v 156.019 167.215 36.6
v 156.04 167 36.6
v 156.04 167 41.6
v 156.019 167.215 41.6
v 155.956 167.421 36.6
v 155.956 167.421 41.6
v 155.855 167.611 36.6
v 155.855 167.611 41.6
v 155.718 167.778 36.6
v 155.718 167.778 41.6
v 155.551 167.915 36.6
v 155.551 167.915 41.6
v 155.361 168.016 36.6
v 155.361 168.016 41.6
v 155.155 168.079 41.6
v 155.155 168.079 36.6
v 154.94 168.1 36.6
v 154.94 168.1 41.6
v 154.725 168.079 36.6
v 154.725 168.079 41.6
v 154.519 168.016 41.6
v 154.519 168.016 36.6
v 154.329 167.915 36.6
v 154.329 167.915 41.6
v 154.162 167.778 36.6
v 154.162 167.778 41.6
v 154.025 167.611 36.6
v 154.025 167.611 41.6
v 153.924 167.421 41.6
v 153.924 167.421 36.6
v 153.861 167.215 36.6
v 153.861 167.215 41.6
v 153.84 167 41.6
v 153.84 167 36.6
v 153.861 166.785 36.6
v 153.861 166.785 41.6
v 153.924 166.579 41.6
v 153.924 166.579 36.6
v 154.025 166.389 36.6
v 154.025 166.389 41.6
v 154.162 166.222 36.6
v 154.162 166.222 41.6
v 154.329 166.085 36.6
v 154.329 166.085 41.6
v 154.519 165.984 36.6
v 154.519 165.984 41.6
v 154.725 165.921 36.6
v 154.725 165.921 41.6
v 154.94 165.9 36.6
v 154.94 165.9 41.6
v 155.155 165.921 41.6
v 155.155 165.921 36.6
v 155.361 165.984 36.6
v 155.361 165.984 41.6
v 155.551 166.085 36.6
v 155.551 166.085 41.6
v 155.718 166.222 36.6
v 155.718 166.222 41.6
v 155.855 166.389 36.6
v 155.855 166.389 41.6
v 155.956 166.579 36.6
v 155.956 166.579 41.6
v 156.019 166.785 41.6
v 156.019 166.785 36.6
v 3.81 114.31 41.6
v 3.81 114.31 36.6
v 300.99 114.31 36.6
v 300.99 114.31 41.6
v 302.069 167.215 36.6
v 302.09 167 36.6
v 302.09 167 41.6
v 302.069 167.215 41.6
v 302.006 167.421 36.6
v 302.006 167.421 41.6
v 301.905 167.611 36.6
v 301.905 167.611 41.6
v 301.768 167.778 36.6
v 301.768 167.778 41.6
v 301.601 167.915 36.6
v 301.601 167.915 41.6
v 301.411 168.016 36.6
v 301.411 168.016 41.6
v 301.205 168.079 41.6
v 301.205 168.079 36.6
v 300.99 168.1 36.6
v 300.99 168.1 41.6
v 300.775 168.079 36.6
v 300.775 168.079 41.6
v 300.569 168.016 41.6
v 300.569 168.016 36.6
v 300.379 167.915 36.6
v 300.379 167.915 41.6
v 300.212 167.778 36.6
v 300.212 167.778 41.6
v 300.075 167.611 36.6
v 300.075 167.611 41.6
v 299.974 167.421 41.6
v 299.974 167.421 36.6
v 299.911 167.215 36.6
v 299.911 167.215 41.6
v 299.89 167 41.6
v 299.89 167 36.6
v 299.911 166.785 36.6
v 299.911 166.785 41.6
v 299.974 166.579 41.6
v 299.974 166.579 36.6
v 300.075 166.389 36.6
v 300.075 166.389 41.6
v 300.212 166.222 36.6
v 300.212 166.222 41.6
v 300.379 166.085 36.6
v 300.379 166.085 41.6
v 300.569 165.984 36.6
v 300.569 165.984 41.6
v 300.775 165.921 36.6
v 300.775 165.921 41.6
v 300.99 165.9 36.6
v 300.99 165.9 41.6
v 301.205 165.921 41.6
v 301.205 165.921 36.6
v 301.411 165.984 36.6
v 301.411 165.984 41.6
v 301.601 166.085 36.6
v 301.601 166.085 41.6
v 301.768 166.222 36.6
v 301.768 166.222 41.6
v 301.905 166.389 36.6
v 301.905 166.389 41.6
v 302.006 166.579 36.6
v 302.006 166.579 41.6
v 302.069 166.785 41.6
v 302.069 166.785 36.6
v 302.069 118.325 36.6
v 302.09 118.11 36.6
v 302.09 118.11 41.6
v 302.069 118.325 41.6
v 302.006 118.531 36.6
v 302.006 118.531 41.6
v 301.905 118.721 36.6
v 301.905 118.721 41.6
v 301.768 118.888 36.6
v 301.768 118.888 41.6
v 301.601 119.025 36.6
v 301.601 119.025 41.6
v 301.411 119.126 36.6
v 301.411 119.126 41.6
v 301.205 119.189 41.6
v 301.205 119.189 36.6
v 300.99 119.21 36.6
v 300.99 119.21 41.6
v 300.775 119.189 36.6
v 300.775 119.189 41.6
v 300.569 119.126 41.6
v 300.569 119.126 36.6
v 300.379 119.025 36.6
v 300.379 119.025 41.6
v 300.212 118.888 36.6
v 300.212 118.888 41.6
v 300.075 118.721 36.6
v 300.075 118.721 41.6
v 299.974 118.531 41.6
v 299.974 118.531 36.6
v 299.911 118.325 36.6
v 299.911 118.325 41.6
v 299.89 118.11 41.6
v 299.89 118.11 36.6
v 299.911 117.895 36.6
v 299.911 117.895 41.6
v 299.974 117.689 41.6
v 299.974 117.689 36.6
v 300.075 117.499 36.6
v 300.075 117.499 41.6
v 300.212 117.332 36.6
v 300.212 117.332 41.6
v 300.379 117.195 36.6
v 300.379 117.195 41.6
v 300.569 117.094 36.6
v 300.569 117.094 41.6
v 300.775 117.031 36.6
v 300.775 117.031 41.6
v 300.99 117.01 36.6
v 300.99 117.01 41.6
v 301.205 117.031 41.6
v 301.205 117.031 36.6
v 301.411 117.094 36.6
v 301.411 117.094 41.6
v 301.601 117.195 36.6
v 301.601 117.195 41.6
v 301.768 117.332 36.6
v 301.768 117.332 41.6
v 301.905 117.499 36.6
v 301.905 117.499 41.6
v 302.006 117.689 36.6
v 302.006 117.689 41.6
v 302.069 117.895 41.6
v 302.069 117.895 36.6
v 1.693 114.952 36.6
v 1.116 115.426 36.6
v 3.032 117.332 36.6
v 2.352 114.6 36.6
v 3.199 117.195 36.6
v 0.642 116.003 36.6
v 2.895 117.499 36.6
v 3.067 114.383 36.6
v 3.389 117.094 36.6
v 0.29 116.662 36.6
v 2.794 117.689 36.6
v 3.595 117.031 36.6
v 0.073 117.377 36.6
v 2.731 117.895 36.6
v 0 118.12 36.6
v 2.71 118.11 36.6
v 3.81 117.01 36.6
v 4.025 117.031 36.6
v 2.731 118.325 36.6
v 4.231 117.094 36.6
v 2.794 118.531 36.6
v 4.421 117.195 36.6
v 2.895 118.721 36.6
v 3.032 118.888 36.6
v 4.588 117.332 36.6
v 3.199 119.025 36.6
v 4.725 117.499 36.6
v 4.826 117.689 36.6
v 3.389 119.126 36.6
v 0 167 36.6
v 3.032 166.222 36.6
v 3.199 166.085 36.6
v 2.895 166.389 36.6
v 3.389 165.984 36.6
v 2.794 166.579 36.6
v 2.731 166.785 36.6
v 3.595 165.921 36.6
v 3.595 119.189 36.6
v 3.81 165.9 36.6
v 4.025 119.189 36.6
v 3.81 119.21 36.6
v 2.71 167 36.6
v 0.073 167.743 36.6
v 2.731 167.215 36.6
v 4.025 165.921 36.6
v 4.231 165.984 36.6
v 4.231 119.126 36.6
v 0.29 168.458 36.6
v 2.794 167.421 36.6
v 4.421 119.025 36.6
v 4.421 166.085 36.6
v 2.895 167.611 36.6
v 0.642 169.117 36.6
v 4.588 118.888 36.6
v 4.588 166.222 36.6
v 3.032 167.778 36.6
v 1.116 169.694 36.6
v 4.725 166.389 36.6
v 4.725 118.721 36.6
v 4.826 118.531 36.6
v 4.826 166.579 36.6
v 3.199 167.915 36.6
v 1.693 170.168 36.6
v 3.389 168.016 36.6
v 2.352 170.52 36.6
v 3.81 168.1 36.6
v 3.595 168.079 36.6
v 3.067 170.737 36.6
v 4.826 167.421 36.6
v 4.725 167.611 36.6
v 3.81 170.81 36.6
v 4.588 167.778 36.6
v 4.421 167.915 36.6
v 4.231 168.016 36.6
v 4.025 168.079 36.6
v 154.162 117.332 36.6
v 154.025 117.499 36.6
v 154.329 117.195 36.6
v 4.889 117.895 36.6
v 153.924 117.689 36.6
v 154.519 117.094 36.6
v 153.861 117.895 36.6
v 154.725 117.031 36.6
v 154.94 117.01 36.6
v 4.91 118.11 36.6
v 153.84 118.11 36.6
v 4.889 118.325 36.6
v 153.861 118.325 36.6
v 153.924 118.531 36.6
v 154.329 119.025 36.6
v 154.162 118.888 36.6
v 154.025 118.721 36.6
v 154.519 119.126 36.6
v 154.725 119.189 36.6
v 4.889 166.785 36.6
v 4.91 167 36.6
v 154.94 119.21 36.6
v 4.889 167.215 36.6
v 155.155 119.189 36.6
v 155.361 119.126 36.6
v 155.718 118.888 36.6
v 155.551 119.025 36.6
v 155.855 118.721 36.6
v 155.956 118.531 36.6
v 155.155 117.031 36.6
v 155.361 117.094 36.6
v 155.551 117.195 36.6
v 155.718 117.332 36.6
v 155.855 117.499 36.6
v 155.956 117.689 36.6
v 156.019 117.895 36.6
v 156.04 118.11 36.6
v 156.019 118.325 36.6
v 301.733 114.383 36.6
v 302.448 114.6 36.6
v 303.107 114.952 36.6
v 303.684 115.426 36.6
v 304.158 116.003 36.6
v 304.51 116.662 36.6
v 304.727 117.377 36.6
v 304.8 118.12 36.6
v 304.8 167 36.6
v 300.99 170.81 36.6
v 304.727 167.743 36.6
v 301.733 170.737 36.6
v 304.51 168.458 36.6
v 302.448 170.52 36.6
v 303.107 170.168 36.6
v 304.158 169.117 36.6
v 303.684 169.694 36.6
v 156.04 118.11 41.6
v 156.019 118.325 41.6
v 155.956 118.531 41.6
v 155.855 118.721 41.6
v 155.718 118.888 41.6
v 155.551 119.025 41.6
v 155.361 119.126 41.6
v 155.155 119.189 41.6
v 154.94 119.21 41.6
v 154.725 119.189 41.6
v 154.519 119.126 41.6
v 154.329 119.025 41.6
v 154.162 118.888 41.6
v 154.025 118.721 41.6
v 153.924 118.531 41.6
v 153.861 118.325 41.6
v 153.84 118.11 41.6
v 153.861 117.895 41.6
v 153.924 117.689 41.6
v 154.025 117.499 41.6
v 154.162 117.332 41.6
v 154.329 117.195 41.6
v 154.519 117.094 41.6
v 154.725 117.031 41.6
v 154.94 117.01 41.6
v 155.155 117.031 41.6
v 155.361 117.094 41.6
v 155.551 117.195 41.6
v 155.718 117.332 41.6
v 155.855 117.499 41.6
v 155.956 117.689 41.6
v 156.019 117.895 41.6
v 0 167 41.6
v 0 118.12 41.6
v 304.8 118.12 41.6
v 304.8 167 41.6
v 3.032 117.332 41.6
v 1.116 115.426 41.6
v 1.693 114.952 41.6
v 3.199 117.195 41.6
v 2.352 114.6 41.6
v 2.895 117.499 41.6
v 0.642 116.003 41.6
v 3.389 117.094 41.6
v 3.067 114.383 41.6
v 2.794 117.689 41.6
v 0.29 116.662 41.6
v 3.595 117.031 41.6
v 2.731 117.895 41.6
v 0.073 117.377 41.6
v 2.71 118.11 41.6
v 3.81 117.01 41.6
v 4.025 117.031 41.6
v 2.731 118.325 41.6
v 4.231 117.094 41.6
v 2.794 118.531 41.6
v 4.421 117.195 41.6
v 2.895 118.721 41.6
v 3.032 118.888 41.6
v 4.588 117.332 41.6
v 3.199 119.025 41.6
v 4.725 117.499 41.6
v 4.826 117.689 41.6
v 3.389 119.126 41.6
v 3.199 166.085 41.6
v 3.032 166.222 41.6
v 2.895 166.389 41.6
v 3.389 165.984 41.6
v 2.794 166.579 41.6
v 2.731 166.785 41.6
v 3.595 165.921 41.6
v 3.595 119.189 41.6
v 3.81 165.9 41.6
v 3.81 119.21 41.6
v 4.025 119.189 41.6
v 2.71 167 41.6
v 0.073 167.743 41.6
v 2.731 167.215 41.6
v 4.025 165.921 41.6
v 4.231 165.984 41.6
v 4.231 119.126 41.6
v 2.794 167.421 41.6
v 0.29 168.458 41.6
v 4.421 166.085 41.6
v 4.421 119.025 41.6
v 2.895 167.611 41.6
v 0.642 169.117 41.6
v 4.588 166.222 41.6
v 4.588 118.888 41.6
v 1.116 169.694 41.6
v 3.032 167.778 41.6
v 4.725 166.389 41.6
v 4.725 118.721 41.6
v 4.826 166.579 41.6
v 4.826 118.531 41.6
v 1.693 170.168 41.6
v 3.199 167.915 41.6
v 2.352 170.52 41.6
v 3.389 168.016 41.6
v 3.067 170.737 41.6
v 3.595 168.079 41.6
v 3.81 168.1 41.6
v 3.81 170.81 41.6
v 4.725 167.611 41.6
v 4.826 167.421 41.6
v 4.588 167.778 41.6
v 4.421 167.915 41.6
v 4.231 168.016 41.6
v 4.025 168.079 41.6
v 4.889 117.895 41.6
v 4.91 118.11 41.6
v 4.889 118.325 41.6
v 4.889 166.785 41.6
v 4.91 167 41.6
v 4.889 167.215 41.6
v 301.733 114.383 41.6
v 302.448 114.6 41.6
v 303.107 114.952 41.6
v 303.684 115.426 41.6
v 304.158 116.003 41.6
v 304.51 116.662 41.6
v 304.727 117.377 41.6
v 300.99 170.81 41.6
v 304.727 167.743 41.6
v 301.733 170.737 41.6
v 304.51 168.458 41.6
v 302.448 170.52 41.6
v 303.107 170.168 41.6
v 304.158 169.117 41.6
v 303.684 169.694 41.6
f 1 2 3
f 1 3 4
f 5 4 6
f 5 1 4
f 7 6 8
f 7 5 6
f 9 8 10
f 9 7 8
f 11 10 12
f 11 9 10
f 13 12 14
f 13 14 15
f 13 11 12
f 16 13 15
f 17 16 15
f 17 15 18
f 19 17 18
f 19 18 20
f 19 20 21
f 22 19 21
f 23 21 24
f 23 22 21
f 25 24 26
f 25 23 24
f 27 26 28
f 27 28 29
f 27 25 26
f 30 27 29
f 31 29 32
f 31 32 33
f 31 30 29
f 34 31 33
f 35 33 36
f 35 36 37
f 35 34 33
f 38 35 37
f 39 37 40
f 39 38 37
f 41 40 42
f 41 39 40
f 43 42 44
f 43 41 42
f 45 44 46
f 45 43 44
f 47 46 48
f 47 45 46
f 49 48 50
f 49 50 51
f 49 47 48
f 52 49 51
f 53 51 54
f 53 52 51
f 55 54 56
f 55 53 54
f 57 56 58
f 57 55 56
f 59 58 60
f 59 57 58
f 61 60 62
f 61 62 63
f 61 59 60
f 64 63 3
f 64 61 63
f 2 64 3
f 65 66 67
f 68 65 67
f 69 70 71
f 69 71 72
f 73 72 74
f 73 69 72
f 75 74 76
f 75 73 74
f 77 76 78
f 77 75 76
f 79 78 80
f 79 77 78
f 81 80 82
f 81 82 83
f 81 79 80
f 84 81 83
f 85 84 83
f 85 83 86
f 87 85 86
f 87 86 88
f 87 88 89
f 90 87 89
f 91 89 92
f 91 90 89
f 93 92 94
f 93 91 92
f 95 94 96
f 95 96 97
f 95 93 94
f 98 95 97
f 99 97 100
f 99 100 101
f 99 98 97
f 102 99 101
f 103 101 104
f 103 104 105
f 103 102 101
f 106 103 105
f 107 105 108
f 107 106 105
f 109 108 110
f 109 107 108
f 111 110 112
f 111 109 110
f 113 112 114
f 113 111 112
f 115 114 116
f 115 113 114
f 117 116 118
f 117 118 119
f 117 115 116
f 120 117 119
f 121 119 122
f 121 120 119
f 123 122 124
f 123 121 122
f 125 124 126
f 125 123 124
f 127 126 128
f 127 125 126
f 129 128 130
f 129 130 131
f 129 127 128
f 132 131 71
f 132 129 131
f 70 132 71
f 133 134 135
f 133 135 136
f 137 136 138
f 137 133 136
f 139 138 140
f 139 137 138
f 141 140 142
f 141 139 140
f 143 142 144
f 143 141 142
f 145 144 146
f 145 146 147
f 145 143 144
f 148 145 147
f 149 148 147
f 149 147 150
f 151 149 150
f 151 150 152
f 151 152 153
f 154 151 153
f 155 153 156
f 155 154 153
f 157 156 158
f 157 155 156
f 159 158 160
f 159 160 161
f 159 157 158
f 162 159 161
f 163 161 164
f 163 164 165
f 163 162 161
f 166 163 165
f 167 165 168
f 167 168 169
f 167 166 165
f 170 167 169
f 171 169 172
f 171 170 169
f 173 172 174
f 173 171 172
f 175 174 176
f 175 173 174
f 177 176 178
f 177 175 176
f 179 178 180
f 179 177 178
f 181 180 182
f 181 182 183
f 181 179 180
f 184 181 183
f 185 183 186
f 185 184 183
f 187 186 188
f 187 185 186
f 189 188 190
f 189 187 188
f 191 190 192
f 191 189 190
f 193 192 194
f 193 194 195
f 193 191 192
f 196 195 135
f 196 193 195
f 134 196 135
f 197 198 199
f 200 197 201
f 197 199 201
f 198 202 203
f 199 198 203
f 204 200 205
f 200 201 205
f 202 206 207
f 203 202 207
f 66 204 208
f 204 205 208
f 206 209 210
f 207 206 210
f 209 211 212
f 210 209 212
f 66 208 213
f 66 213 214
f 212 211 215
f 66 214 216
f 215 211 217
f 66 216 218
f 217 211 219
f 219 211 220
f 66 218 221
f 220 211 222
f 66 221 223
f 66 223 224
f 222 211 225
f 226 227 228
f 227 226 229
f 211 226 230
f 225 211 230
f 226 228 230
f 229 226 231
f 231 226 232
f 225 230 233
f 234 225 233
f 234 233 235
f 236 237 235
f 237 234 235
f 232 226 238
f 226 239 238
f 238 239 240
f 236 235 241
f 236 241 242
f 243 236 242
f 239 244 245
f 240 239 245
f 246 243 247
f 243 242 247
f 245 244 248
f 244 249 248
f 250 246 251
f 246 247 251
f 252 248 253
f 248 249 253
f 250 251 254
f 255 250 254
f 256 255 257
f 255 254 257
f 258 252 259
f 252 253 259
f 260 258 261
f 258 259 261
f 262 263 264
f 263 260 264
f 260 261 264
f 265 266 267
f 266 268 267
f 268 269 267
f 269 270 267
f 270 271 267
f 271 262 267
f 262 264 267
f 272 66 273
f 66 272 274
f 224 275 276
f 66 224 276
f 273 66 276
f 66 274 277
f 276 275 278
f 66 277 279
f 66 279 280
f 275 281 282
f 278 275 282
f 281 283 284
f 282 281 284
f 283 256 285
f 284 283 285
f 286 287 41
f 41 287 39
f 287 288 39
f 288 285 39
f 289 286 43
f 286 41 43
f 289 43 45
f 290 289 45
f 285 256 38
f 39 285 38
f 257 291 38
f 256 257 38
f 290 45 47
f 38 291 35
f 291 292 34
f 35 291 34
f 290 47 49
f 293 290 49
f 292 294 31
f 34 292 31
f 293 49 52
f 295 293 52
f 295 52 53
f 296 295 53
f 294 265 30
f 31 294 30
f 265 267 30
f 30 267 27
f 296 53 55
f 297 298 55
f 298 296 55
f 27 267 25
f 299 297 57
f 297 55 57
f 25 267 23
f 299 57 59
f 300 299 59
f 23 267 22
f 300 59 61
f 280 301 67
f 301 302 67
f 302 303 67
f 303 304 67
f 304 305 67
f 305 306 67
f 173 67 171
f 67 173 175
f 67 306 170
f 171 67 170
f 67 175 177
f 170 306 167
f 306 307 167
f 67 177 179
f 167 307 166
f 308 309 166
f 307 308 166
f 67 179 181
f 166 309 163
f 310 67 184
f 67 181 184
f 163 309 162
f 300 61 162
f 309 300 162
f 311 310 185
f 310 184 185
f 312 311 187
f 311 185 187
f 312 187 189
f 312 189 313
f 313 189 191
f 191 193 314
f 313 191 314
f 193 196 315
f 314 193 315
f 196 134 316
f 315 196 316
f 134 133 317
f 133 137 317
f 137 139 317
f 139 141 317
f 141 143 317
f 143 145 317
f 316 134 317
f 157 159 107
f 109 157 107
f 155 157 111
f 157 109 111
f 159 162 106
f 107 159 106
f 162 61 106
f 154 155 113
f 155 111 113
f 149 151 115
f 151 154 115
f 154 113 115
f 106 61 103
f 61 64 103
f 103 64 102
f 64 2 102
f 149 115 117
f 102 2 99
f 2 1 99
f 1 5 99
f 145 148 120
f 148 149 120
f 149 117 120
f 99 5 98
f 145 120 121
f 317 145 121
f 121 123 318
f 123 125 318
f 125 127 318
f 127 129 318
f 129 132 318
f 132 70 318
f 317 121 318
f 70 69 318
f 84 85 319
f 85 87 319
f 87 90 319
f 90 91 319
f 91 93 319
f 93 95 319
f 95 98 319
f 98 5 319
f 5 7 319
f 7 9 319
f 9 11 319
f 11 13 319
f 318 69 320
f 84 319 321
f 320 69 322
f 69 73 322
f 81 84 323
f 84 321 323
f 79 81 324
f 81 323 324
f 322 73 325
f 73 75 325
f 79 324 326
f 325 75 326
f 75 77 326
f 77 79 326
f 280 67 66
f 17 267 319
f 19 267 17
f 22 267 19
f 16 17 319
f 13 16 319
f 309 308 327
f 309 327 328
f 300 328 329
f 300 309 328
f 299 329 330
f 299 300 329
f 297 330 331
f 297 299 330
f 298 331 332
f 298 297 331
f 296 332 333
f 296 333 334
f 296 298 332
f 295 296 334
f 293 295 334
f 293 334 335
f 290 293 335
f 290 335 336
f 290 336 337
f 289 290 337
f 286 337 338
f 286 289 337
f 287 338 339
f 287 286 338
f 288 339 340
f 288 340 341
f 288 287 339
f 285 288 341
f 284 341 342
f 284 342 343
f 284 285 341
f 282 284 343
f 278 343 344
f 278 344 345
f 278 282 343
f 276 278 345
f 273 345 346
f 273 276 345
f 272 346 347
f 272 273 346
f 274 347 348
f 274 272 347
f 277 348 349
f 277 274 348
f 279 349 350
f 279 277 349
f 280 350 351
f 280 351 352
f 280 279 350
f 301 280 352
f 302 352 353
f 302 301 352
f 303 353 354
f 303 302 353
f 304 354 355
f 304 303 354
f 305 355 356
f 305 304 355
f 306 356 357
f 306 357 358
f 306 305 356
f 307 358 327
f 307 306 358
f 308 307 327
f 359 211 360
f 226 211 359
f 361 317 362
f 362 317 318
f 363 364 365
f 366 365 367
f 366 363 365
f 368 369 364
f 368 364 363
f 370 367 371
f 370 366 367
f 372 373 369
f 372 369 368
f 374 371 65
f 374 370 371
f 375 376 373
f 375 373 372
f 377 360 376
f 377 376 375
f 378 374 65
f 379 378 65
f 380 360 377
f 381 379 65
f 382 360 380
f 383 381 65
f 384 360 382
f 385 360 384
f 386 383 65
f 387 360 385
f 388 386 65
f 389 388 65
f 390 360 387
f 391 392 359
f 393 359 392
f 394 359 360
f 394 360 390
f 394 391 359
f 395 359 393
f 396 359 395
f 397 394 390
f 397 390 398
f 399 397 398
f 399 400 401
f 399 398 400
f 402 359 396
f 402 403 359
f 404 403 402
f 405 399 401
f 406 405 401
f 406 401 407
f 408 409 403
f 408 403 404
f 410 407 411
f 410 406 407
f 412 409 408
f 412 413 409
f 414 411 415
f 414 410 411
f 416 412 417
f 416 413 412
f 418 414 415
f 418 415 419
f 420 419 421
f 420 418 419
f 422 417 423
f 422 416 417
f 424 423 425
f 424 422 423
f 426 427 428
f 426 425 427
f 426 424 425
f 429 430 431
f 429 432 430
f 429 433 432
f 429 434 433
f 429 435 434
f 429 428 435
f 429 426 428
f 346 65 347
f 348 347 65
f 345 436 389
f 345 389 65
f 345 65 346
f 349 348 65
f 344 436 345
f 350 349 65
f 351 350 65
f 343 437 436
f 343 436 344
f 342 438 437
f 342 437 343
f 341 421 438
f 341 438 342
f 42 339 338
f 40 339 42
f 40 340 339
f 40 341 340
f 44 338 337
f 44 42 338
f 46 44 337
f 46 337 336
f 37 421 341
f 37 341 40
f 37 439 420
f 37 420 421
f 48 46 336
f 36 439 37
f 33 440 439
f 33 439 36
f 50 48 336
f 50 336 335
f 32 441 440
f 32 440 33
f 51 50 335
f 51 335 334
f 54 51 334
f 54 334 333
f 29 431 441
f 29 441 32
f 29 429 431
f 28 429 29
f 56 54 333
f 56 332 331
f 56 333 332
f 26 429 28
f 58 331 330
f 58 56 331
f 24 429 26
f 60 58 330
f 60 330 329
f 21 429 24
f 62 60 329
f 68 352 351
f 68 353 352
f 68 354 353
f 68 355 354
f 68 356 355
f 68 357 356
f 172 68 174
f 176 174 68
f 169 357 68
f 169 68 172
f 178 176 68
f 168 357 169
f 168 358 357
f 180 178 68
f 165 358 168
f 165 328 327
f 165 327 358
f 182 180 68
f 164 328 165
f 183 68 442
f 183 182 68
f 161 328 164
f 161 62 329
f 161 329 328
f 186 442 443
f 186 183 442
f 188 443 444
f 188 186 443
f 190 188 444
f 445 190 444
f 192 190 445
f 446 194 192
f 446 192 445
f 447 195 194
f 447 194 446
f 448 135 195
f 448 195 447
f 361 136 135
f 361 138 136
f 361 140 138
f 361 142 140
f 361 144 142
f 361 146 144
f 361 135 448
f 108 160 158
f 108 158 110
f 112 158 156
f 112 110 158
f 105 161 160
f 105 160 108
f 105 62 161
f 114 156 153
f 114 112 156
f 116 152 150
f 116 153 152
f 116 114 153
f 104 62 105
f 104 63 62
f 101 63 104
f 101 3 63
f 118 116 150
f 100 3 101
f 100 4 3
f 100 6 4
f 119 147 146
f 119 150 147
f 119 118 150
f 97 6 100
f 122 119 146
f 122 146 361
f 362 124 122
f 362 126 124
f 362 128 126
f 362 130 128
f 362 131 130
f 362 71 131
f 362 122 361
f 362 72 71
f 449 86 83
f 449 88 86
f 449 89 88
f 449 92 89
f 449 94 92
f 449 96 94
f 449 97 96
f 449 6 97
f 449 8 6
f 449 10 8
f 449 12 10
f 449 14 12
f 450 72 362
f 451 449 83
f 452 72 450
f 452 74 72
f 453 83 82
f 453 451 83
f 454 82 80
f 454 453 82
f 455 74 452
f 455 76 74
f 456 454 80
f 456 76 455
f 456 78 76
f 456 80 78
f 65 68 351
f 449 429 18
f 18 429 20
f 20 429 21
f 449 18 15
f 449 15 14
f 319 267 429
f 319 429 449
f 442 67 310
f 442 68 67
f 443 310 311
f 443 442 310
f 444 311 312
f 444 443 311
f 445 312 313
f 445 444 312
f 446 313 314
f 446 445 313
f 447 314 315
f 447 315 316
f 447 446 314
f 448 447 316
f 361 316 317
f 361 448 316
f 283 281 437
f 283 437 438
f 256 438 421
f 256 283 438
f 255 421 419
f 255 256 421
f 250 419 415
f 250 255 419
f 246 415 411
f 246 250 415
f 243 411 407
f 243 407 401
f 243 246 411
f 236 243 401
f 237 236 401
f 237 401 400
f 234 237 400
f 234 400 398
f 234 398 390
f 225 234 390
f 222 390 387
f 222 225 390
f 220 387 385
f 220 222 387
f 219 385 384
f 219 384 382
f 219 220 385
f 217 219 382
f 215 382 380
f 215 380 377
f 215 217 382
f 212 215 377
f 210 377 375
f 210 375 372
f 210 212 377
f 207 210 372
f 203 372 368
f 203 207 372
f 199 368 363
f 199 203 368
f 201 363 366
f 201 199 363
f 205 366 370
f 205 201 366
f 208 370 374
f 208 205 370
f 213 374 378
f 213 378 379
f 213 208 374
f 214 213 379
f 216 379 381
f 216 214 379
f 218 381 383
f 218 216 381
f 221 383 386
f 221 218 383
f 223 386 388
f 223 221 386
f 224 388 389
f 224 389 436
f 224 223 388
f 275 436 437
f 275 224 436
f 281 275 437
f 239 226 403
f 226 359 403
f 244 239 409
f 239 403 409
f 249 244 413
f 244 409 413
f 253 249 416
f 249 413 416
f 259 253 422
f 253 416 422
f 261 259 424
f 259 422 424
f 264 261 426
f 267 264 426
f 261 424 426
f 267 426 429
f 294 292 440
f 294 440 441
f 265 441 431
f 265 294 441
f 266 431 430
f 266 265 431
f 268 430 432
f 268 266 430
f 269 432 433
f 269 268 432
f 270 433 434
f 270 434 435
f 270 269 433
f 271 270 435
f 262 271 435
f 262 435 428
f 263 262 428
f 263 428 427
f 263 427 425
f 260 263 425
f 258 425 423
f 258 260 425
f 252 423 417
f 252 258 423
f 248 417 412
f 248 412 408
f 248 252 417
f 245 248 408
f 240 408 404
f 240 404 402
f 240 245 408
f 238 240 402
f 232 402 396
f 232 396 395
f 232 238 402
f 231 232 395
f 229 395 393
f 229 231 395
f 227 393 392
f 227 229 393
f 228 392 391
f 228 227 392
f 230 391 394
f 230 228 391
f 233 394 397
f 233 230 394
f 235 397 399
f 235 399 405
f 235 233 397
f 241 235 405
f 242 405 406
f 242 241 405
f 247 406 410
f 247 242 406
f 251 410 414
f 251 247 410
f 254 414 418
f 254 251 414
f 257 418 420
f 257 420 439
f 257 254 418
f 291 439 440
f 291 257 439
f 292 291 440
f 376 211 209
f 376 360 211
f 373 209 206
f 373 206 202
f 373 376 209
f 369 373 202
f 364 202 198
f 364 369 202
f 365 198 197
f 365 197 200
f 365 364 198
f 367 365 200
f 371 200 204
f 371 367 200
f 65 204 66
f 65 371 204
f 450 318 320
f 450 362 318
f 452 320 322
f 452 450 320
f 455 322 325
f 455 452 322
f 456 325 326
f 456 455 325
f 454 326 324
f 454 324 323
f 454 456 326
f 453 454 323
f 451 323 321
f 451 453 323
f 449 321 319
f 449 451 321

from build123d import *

# Parameters (mm, degrees)
CYLINDER013_R     = 1.1
CYLINDER013_DEPTH = 5
CYLINDER014_R     = 1.1
CYLINDER014_DEPTH = 5
CYLINDER015_R     = 1.1
CYLINDER015_DEPTH = 5
CYLINDER016_R     = 1.1
CYLINDER016_DEPTH = 5
CYLINDER017_R     = 1.1
CYLINDER017_DEPTH = 5
CYLINDER012_R     = 1.1
CYLINDER012_DEPTH = 5
BOX001_W          = 304.8
BOX001_H          = 56.5
BOX001_DEPTH      = 5
FILLET001_R       = 3.81


with BuildPart() as hptm001:
    # Cylinder013 → Cylinder013 (new body)
    with BuildSketch(Plane(origin=(154.94, 167, 36.6), x_dir=(1, 0, 0), z_dir=(0, 0, 1))):
        Circle(CYLINDER013_R)
    extrude(amount=CYLINDER013_DEPTH)


with BuildPart() as hptr001:
    # Cylinder014 → Cylinder014 (new body)
    with BuildSketch(Plane(origin=(300.99, 167, 36.6), x_dir=(1, 0, 0), z_dir=(0, 0, 1))):
        Circle(CYLINDER014_R)
    extrude(amount=CYLINDER014_DEPTH)


with BuildPart() as hpbl001:
    # Cylinder015 → Cylinder015 (new body)
    with BuildSketch(Plane(origin=(3.81, 118.11, 36.6), x_dir=(1, 0, 0), z_dir=(0, 0, 1))):
        Circle(CYLINDER015_R)
    extrude(amount=CYLINDER015_DEPTH)


with BuildPart() as hpbm001:
    # Cylinder016 → Cylinder016 (new body)
    with BuildSketch(Plane(origin=(154.94, 118.11, 36.6), x_dir=(1, 0, 0), z_dir=(0, 0, 1))):
        Circle(CYLINDER016_R)
    extrude(amount=CYLINDER016_DEPTH)


with BuildPart() as hpbr001:
    # Cylinder017 → Cylinder017 (new body)
    with BuildSketch(Plane(origin=(300.99, 118.11, 36.6), x_dir=(1, 0, 0), z_dir=(0, 0, 1))):
        Circle(CYLINDER017_R)
    extrude(amount=CYLINDER017_DEPTH)


with BuildPart() as fusion001:
    # Cylinder012 → Cylinder012 (new body)
    with BuildSketch(Plane(origin=(3.81, 167, 36.6), x_dir=(1, 0, 0), z_dir=(0, 0, 1))):
        Circle(CYLINDER012_R)
    extrude(amount=CYLINDER012_DEPTH)

    # Fusion001: union HPTM001, HPTR001, HPBL001, HPBM001, HPBR001
    add(hptm001.part)
    add(hptr001.part)
    add(hpbl001.part)
    add(hpbm001.part)
    add(hpbr001.part)


with BuildPart() as cut001:
    # Box001 → Box001 (new body)
    with BuildSketch(Plane(origin=(0, 114.31, 36.6), x_dir=(1, 0, 0), z_dir=(0, 0, 1))):
        with Locations((152.4, 28.25)):
            Rectangle(BOX001_W, BOX001_H)
    extrude(amount=BOX001_DEPTH)

    # Fillet001
    fillet001_edges = [cut001.edges().sort_by_distance(p)[0] for p in [
        (0, 114.31, 39.1),
        (0, 170.81, 39.1),
        (304.8, 114.31, 39.1),
        (304.8, 170.81, 39.1),
    ]]
    fillet(fillet001_edges, radius=FILLET001_R)

    # Cut001: cut Fusion001
    add(fusion001.part, mode=Mode.SUBTRACT)


solid = cut001.part
